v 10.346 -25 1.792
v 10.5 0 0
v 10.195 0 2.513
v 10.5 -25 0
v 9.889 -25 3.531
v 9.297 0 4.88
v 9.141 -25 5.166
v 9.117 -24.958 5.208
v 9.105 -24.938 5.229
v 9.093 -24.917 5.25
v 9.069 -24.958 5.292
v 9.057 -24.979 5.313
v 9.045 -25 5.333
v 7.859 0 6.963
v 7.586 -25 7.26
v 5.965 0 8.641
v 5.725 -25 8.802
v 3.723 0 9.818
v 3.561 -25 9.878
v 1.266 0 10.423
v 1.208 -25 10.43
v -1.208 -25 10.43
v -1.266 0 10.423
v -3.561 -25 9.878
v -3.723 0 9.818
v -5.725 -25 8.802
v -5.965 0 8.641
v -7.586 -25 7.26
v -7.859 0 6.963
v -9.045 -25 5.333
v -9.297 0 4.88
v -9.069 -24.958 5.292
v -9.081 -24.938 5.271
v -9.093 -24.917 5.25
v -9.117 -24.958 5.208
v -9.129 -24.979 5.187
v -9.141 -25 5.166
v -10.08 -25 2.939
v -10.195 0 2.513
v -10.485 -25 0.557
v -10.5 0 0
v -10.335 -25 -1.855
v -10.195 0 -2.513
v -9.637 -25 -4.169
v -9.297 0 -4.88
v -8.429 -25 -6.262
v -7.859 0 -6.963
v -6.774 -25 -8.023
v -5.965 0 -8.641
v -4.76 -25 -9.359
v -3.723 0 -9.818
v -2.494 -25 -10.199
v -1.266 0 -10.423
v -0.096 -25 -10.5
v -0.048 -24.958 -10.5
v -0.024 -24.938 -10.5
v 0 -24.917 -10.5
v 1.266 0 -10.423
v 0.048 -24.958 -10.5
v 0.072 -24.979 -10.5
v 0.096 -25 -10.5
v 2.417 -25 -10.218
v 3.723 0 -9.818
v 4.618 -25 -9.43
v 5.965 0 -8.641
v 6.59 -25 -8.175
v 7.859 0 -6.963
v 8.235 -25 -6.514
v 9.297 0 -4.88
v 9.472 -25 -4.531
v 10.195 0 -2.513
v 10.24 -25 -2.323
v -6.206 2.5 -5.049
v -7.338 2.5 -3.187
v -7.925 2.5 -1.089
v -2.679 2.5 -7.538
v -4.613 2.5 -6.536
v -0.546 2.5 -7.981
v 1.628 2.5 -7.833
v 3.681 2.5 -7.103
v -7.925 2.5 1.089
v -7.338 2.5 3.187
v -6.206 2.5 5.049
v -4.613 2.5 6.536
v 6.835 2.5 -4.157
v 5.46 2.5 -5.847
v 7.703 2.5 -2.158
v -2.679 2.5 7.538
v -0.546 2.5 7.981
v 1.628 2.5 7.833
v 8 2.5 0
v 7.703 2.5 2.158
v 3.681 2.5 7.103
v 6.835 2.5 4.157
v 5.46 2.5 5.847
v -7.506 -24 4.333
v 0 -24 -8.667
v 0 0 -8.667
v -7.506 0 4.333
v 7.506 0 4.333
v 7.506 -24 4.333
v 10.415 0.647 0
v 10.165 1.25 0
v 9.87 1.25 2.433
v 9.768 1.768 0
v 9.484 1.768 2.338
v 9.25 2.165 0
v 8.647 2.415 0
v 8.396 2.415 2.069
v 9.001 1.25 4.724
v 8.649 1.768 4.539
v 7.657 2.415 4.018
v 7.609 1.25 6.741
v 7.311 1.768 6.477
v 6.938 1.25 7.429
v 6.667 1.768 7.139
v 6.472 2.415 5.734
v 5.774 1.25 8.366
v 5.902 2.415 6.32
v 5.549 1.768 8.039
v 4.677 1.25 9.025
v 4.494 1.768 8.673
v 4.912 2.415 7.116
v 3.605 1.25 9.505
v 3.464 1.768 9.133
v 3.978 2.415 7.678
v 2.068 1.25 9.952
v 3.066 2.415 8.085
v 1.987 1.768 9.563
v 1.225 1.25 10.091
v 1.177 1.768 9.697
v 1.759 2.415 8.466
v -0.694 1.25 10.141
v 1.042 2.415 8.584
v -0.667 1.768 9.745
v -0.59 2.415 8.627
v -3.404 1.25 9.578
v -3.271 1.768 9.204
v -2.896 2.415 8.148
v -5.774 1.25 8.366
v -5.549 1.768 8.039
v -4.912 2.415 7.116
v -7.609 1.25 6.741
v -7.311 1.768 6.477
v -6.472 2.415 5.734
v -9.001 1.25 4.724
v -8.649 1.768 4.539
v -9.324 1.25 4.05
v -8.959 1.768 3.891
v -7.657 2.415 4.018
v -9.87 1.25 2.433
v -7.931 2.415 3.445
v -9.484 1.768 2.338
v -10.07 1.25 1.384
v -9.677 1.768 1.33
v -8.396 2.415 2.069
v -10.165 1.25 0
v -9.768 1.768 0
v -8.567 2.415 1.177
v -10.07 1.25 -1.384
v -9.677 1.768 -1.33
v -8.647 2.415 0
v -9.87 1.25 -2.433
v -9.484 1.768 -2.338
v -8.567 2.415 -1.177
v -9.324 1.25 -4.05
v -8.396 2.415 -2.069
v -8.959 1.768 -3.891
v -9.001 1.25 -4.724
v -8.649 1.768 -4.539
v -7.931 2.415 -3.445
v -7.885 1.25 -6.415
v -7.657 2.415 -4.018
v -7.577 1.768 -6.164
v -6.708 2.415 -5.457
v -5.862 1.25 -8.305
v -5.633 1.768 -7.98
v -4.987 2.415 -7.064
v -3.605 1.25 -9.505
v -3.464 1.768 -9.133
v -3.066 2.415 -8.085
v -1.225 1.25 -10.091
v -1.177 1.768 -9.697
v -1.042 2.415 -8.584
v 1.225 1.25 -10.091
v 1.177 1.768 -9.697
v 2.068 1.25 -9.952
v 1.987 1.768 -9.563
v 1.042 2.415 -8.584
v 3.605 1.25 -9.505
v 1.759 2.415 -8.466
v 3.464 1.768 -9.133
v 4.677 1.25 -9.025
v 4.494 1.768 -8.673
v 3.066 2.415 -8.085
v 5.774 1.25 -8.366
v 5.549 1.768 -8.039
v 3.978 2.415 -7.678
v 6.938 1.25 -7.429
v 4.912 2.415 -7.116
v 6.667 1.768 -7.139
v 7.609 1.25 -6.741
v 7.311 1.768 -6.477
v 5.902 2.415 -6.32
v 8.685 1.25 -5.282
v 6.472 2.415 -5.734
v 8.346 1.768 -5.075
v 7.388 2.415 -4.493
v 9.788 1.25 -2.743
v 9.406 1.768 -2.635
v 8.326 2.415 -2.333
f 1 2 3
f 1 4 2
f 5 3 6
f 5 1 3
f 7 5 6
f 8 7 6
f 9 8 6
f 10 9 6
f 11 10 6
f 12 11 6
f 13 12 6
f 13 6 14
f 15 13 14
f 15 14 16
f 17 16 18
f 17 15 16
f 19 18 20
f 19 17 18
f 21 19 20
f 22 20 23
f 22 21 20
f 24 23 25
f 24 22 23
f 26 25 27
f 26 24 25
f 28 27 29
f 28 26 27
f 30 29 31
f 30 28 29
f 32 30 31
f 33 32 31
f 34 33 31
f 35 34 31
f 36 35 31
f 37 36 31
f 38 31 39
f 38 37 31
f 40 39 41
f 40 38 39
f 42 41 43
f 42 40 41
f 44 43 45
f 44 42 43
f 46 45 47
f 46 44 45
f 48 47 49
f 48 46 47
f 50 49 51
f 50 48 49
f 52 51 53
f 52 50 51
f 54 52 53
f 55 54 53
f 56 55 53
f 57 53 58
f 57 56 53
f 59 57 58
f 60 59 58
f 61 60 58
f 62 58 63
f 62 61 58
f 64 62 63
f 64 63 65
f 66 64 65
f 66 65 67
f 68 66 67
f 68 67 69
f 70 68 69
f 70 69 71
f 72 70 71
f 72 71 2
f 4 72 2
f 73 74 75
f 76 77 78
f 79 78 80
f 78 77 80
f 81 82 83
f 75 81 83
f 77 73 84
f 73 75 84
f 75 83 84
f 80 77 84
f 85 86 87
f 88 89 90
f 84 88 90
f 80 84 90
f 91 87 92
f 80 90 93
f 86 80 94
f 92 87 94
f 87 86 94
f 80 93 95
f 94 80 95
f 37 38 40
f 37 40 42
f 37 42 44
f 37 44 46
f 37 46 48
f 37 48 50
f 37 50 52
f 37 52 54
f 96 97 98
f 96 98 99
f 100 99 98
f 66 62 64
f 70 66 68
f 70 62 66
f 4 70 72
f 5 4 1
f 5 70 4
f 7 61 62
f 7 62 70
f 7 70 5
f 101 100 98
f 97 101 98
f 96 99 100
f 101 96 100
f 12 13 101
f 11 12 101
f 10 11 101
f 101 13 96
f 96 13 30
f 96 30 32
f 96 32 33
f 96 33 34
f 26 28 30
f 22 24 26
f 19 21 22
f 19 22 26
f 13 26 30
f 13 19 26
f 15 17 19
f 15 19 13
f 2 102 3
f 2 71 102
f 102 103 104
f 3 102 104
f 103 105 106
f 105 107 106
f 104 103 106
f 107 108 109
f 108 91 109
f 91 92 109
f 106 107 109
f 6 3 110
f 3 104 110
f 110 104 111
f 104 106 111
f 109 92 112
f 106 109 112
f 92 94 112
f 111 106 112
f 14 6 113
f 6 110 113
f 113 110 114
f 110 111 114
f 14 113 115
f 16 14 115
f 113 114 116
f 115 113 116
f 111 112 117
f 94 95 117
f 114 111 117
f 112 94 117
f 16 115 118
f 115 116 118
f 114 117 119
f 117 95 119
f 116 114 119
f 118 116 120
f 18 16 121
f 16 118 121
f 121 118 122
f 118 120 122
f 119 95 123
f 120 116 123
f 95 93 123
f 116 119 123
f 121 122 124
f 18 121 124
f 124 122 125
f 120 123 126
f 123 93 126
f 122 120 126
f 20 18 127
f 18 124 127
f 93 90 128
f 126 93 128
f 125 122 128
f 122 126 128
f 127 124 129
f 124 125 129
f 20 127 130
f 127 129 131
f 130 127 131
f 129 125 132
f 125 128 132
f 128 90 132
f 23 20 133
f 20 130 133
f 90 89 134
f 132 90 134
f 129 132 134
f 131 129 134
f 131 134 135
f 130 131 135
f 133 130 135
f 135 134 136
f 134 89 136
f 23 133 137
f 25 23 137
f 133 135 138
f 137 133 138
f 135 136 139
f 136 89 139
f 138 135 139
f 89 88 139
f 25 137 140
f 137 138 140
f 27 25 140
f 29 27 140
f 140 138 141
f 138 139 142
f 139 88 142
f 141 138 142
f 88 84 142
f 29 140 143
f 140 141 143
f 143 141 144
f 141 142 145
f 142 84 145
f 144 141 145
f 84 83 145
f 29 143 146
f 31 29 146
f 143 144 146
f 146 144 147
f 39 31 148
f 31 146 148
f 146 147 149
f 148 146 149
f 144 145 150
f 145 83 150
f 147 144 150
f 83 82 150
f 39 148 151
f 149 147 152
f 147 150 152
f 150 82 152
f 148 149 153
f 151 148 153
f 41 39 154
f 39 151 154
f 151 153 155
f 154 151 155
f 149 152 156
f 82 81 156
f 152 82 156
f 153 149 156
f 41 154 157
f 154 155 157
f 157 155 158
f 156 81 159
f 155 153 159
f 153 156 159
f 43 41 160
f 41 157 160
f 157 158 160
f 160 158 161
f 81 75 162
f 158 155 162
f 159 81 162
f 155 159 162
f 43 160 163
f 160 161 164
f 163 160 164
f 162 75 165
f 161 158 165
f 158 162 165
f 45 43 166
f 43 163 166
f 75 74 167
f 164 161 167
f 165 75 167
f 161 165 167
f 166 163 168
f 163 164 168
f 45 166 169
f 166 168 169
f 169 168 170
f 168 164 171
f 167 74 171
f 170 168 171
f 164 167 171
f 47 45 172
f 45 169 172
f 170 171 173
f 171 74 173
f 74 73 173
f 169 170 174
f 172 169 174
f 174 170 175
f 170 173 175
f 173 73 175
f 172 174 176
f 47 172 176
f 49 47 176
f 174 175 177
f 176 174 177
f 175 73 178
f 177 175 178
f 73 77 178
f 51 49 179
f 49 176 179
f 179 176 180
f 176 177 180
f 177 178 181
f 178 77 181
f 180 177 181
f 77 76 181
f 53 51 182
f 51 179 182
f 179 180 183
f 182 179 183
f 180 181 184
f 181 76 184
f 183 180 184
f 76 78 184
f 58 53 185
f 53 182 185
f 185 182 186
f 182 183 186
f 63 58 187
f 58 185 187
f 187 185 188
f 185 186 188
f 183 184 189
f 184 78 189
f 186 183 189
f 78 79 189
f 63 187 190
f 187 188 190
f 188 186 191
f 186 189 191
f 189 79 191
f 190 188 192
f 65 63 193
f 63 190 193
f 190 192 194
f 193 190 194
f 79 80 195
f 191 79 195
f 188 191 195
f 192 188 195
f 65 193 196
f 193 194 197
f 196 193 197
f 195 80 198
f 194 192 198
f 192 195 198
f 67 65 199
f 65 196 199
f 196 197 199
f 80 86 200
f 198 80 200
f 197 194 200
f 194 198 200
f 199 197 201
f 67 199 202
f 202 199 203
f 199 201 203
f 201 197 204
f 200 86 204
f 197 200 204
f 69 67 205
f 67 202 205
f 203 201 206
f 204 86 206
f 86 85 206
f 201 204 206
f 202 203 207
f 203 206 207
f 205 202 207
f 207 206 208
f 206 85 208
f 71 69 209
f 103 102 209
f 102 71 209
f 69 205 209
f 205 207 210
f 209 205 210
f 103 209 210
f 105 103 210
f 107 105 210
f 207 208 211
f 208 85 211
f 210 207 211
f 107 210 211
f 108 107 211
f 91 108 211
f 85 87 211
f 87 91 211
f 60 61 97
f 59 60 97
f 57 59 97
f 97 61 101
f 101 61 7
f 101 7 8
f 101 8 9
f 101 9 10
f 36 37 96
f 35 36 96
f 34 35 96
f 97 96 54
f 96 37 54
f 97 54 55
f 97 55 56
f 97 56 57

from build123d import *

# Parameters (mm, degrees)
F0_R         = 10.5
F1_DEPTH     = 25
F2_R         = 10.5
F3_DEPTH     = 2.5
F4_R         = 2.49999
F5_T4_DEPTH  = 20.1544729749
F5_T10_DEPTH = 20.1544729749
F5_T16_DEPTH = 20.1544729749
F5_T23_DEPTH = 20.1544729749
F5_T27_DEPTH = 20.1544729749
F5_T34_DEPTH = 20.1544729749
F5_T38_DEPTH = 20.1544729749
F5_T45_DEPTH = 20.1544729749
F5_T49_DEPTH = 20.1544729749


# Not quite as in the source:
# - a fillet or chamfer that OpenCascade refuses, or shapes differently, is made with other operations: its cross-section is extruded or revolved along the edge and cut away or added
# - a fillet or chamfer is up to 0.001 mm smaller than in the source, because OpenCascade refuses the exact size


with BuildPart() as f1:
    # F0 (on Front) → F1 (new body)
    with BuildSketch(Plane.XZ):
        Circle(F0_R)
        Polygon((0, -8.6666666667), (-7.5055534995, 4.3333333333), (7.5055534995, 4.3333333333), align=None, mode=Mode.SUBTRACT)
    extrude(amount=F1_DEPTH)

    # F2 (on Front) → F3 (join)
    with BuildSketch(Plane.XZ):
        Circle(F2_R)
    extrude(amount=-F3_DEPTH)

    # F4 (radius 2.5 in the source; OpenCascade refuses exactly that, so slightly less here)
    f4_edges = [f1.edges().sort_by_distance(p)[0] for p in [
        (-10.5, 2.5, 0),
    ]]
    fillet(f4_edges, radius=F4_R)

    # F5: chamfer of 1 on 3 edges, made by hand


with BuildPart() as f5_tool2:
    # F5_s3 → F5_t4 (new body)
    with BuildSketch(Plane(origin=(5.0386182437, 0, -8.7271427981), x_dir=(0, 1, 0), z_dir=(-0.5, 0, 0.8660254038))):
        Polygon((-25, 5.3333333333), (-24, 4.3333333333), (-25, 4.3333333333), align=None)
    extrude(amount=F5_T4_DEPTH)

    split(bisect_by=Plane(origin=(3.7527767497, 0, -2.1666666667), x_dir=(0, 1, 0), z_dir=(-0.8660254038, 0, 0.5)), keep=Keep.TOP)

    split(bisect_by=Plane.XY.offset(4.3333333333), keep=Keep.BOTTOM)


with BuildPart() as f1_1:
    add(f1.part)

    # F5_t1: cut F5_tool2
    add(f5_tool2.part, mode=Mode.SUBTRACT)


with BuildPart() as f5_tool8:
    # F5_s9 → F5_t10 (new body)
    with BuildSketch(Plane.YZ.offset(-10.0772364874)):
        Polygon((-25, 5.3333333333), (-24, 4.3333333333), (-25, 4.3333333333), align=None)
    extrude(amount=F5_T10_DEPTH)

    split(bisect_by=Plane(origin=(3.7527767497, 0, -2.1666666667), x_dir=(0, 1, 0), z_dir=(-0.8660254038, 0, 0.5)), keep=Keep.TOP)

    split(bisect_by=Plane(origin=(-3.7527767497, 0, -2.1666666667), x_dir=(0, 1, 0), z_dir=(0.8660254038, 0, 0.5)), keep=Keep.TOP)


with BuildPart() as f1_2:
    add(f1_1.part)

    # F5_t7: cut F5_tool8
    add(f5_tool8.part, mode=Mode.SUBTRACT)


with BuildPart() as f5_tool14:
    # F5_s15 → F5_t16 (new body)
    with BuildSketch(Plane(origin=(5.0386182437, 0, 8.7271427981), x_dir=(0, 1, 0), z_dir=(-0.5, 0, -0.8660254038))):
        Polygon((-25, 5.3333333333), (-24, 4.3333333333), (-25, 4.3333333333), align=None)
    extrude(amount=F5_T16_DEPTH)

    split(bisect_by=Plane.XY.offset(4.3333333333), keep=Keep.BOTTOM)

    split(bisect_by=Plane(origin=(-3.7527767497, 0, -2.1666666667), x_dir=(0, 1, 0), z_dir=(0.8660254038, 0, 0.5)), keep=Keep.TOP)


with BuildPart() as f1_3:
    add(f1_2.part)

    # F5_t13: cut F5_tool14
    add(f5_tool14.part, mode=Mode.SUBTRACT)


with BuildPart() as f5_tool21:
    # F5_s22 → F5_t23 (new body)
    with BuildSketch(Plane(origin=(5.0386182437, 0, 8.7271427981), x_dir=(0, 1, 0), z_dir=(-0.5, 0, -0.8660254038))):
        Polygon((-25, 5.3333333333), (-24, 4.3333333333), (-25, 4.3333333333), align=None)
    extrude(amount=F5_T23_DEPTH)

    split(bisect_by=Plane(origin=(-3.7527767497, 0, -2.1666666667), x_dir=(0, 1, 0), z_dir=(-0.8660254038, 0, -0.5)), keep=Keep.TOP)


with BuildPart() as f5_tool25:
    # F5_s26 → F5_t27 (new body)
    with BuildSketch(Plane(origin=(5.0386182437, 0, -8.7271427981), x_dir=(0, 1, 0), z_dir=(-0.5, 0, 0.8660254038))):
        Polygon((-25, 5.3333333333), (-24, 4.3333333333), (-25, 4.3333333333), align=None)
    extrude(amount=F5_T27_DEPTH)

    split(bisect_by=Plane(origin=(3.7527767497, 0, -2.1666666667), x_dir=(0, 1, 0), z_dir=(0.8660254038, 0, -0.5)), keep=Keep.TOP)


with BuildPart() as f5_tool21_1:
    add(f5_tool21.part)

    # F5_t29: intersect F5_tool25
    add(f5_tool25.part, mode=Mode.INTERSECT)


with BuildPart() as f1_4:
    add(f1_3.part)

    # F5_t19: cut F5_tool21
    add(f5_tool21_1.part, mode=Mode.SUBTRACT)


with BuildPart() as f5_tool32:
    # F5_s33 → F5_t34 (new body)
    with BuildSketch(Plane(origin=(5.0386182437, 0, -8.7271427981), x_dir=(0, 1, 0), z_dir=(-0.5, 0, 0.8660254038))):
        Polygon((-25, 5.3333333333), (-24, 4.3333333333), (-25, 4.3333333333), align=None)
    extrude(amount=F5_T34_DEPTH)

    split(bisect_by=Plane.XY.offset(4.3333333333), keep=Keep.TOP)


with BuildPart() as f5_tool36:
    # F5_s37 → F5_t38 (new body)
    with BuildSketch(Plane.YZ.offset(-10.0772364874)):
        Polygon((-25, 5.3333333333), (-24, 4.3333333333), (-25, 4.3333333333), align=None)
    extrude(amount=F5_T38_DEPTH)

    split(bisect_by=Plane(origin=(-3.7527767497, 0, -2.1666666667), x_dir=(0, 1, 0), z_dir=(-0.8660254038, 0, -0.5)), keep=Keep.TOP)


with BuildPart() as f5_tool32_1:
    add(f5_tool32.part)

    # F5_t40: intersect F5_tool36
    add(f5_tool36.part, mode=Mode.INTERSECT)


with BuildPart() as f1_5:
    add(f1_4.part)

    # F5_t30: cut F5_tool32
    add(f5_tool32_1.part, mode=Mode.SUBTRACT)


with BuildPart() as f5_tool43:
    # F5_s44 → F5_t45 (new body)
    with BuildSketch(Plane(origin=(5.0386182437, 0, 8.7271427981), x_dir=(0, 1, 0), z_dir=(-0.5, 0, -0.8660254038))):
        Polygon((-25, 5.3333333333), (-24, 4.3333333333), (-25, 4.3333333333), align=None)
    extrude(amount=F5_T45_DEPTH)

    split(bisect_by=Plane.XY.offset(4.3333333333), keep=Keep.TOP)


with BuildPart() as f5_tool47:
    # F5_s48 → F5_t49 (new body)
    with BuildSketch(Plane.YZ.offset(-10.0772364874)):
        Polygon((-25, 5.3333333333), (-24, 4.3333333333), (-25, 4.3333333333), align=None)
    extrude(amount=F5_T49_DEPTH)

    split(bisect_by=Plane(origin=(3.7527767497, 0, -2.1666666667), x_dir=(0, 1, 0), z_dir=(0.8660254038, 0, -0.5)), keep=Keep.TOP)


with BuildPart() as f5_tool43_1:
    add(f5_tool43.part)

    # F5_t51: intersect F5_tool47
    add(f5_tool47.part, mode=Mode.INTERSECT)


with BuildPart() as f1_6:
    add(f1_5.part)

    # F5_t41: cut F5_tool43
    add(f5_tool43_1.part, mode=Mode.SUBTRACT)


solid = f1_6.part
